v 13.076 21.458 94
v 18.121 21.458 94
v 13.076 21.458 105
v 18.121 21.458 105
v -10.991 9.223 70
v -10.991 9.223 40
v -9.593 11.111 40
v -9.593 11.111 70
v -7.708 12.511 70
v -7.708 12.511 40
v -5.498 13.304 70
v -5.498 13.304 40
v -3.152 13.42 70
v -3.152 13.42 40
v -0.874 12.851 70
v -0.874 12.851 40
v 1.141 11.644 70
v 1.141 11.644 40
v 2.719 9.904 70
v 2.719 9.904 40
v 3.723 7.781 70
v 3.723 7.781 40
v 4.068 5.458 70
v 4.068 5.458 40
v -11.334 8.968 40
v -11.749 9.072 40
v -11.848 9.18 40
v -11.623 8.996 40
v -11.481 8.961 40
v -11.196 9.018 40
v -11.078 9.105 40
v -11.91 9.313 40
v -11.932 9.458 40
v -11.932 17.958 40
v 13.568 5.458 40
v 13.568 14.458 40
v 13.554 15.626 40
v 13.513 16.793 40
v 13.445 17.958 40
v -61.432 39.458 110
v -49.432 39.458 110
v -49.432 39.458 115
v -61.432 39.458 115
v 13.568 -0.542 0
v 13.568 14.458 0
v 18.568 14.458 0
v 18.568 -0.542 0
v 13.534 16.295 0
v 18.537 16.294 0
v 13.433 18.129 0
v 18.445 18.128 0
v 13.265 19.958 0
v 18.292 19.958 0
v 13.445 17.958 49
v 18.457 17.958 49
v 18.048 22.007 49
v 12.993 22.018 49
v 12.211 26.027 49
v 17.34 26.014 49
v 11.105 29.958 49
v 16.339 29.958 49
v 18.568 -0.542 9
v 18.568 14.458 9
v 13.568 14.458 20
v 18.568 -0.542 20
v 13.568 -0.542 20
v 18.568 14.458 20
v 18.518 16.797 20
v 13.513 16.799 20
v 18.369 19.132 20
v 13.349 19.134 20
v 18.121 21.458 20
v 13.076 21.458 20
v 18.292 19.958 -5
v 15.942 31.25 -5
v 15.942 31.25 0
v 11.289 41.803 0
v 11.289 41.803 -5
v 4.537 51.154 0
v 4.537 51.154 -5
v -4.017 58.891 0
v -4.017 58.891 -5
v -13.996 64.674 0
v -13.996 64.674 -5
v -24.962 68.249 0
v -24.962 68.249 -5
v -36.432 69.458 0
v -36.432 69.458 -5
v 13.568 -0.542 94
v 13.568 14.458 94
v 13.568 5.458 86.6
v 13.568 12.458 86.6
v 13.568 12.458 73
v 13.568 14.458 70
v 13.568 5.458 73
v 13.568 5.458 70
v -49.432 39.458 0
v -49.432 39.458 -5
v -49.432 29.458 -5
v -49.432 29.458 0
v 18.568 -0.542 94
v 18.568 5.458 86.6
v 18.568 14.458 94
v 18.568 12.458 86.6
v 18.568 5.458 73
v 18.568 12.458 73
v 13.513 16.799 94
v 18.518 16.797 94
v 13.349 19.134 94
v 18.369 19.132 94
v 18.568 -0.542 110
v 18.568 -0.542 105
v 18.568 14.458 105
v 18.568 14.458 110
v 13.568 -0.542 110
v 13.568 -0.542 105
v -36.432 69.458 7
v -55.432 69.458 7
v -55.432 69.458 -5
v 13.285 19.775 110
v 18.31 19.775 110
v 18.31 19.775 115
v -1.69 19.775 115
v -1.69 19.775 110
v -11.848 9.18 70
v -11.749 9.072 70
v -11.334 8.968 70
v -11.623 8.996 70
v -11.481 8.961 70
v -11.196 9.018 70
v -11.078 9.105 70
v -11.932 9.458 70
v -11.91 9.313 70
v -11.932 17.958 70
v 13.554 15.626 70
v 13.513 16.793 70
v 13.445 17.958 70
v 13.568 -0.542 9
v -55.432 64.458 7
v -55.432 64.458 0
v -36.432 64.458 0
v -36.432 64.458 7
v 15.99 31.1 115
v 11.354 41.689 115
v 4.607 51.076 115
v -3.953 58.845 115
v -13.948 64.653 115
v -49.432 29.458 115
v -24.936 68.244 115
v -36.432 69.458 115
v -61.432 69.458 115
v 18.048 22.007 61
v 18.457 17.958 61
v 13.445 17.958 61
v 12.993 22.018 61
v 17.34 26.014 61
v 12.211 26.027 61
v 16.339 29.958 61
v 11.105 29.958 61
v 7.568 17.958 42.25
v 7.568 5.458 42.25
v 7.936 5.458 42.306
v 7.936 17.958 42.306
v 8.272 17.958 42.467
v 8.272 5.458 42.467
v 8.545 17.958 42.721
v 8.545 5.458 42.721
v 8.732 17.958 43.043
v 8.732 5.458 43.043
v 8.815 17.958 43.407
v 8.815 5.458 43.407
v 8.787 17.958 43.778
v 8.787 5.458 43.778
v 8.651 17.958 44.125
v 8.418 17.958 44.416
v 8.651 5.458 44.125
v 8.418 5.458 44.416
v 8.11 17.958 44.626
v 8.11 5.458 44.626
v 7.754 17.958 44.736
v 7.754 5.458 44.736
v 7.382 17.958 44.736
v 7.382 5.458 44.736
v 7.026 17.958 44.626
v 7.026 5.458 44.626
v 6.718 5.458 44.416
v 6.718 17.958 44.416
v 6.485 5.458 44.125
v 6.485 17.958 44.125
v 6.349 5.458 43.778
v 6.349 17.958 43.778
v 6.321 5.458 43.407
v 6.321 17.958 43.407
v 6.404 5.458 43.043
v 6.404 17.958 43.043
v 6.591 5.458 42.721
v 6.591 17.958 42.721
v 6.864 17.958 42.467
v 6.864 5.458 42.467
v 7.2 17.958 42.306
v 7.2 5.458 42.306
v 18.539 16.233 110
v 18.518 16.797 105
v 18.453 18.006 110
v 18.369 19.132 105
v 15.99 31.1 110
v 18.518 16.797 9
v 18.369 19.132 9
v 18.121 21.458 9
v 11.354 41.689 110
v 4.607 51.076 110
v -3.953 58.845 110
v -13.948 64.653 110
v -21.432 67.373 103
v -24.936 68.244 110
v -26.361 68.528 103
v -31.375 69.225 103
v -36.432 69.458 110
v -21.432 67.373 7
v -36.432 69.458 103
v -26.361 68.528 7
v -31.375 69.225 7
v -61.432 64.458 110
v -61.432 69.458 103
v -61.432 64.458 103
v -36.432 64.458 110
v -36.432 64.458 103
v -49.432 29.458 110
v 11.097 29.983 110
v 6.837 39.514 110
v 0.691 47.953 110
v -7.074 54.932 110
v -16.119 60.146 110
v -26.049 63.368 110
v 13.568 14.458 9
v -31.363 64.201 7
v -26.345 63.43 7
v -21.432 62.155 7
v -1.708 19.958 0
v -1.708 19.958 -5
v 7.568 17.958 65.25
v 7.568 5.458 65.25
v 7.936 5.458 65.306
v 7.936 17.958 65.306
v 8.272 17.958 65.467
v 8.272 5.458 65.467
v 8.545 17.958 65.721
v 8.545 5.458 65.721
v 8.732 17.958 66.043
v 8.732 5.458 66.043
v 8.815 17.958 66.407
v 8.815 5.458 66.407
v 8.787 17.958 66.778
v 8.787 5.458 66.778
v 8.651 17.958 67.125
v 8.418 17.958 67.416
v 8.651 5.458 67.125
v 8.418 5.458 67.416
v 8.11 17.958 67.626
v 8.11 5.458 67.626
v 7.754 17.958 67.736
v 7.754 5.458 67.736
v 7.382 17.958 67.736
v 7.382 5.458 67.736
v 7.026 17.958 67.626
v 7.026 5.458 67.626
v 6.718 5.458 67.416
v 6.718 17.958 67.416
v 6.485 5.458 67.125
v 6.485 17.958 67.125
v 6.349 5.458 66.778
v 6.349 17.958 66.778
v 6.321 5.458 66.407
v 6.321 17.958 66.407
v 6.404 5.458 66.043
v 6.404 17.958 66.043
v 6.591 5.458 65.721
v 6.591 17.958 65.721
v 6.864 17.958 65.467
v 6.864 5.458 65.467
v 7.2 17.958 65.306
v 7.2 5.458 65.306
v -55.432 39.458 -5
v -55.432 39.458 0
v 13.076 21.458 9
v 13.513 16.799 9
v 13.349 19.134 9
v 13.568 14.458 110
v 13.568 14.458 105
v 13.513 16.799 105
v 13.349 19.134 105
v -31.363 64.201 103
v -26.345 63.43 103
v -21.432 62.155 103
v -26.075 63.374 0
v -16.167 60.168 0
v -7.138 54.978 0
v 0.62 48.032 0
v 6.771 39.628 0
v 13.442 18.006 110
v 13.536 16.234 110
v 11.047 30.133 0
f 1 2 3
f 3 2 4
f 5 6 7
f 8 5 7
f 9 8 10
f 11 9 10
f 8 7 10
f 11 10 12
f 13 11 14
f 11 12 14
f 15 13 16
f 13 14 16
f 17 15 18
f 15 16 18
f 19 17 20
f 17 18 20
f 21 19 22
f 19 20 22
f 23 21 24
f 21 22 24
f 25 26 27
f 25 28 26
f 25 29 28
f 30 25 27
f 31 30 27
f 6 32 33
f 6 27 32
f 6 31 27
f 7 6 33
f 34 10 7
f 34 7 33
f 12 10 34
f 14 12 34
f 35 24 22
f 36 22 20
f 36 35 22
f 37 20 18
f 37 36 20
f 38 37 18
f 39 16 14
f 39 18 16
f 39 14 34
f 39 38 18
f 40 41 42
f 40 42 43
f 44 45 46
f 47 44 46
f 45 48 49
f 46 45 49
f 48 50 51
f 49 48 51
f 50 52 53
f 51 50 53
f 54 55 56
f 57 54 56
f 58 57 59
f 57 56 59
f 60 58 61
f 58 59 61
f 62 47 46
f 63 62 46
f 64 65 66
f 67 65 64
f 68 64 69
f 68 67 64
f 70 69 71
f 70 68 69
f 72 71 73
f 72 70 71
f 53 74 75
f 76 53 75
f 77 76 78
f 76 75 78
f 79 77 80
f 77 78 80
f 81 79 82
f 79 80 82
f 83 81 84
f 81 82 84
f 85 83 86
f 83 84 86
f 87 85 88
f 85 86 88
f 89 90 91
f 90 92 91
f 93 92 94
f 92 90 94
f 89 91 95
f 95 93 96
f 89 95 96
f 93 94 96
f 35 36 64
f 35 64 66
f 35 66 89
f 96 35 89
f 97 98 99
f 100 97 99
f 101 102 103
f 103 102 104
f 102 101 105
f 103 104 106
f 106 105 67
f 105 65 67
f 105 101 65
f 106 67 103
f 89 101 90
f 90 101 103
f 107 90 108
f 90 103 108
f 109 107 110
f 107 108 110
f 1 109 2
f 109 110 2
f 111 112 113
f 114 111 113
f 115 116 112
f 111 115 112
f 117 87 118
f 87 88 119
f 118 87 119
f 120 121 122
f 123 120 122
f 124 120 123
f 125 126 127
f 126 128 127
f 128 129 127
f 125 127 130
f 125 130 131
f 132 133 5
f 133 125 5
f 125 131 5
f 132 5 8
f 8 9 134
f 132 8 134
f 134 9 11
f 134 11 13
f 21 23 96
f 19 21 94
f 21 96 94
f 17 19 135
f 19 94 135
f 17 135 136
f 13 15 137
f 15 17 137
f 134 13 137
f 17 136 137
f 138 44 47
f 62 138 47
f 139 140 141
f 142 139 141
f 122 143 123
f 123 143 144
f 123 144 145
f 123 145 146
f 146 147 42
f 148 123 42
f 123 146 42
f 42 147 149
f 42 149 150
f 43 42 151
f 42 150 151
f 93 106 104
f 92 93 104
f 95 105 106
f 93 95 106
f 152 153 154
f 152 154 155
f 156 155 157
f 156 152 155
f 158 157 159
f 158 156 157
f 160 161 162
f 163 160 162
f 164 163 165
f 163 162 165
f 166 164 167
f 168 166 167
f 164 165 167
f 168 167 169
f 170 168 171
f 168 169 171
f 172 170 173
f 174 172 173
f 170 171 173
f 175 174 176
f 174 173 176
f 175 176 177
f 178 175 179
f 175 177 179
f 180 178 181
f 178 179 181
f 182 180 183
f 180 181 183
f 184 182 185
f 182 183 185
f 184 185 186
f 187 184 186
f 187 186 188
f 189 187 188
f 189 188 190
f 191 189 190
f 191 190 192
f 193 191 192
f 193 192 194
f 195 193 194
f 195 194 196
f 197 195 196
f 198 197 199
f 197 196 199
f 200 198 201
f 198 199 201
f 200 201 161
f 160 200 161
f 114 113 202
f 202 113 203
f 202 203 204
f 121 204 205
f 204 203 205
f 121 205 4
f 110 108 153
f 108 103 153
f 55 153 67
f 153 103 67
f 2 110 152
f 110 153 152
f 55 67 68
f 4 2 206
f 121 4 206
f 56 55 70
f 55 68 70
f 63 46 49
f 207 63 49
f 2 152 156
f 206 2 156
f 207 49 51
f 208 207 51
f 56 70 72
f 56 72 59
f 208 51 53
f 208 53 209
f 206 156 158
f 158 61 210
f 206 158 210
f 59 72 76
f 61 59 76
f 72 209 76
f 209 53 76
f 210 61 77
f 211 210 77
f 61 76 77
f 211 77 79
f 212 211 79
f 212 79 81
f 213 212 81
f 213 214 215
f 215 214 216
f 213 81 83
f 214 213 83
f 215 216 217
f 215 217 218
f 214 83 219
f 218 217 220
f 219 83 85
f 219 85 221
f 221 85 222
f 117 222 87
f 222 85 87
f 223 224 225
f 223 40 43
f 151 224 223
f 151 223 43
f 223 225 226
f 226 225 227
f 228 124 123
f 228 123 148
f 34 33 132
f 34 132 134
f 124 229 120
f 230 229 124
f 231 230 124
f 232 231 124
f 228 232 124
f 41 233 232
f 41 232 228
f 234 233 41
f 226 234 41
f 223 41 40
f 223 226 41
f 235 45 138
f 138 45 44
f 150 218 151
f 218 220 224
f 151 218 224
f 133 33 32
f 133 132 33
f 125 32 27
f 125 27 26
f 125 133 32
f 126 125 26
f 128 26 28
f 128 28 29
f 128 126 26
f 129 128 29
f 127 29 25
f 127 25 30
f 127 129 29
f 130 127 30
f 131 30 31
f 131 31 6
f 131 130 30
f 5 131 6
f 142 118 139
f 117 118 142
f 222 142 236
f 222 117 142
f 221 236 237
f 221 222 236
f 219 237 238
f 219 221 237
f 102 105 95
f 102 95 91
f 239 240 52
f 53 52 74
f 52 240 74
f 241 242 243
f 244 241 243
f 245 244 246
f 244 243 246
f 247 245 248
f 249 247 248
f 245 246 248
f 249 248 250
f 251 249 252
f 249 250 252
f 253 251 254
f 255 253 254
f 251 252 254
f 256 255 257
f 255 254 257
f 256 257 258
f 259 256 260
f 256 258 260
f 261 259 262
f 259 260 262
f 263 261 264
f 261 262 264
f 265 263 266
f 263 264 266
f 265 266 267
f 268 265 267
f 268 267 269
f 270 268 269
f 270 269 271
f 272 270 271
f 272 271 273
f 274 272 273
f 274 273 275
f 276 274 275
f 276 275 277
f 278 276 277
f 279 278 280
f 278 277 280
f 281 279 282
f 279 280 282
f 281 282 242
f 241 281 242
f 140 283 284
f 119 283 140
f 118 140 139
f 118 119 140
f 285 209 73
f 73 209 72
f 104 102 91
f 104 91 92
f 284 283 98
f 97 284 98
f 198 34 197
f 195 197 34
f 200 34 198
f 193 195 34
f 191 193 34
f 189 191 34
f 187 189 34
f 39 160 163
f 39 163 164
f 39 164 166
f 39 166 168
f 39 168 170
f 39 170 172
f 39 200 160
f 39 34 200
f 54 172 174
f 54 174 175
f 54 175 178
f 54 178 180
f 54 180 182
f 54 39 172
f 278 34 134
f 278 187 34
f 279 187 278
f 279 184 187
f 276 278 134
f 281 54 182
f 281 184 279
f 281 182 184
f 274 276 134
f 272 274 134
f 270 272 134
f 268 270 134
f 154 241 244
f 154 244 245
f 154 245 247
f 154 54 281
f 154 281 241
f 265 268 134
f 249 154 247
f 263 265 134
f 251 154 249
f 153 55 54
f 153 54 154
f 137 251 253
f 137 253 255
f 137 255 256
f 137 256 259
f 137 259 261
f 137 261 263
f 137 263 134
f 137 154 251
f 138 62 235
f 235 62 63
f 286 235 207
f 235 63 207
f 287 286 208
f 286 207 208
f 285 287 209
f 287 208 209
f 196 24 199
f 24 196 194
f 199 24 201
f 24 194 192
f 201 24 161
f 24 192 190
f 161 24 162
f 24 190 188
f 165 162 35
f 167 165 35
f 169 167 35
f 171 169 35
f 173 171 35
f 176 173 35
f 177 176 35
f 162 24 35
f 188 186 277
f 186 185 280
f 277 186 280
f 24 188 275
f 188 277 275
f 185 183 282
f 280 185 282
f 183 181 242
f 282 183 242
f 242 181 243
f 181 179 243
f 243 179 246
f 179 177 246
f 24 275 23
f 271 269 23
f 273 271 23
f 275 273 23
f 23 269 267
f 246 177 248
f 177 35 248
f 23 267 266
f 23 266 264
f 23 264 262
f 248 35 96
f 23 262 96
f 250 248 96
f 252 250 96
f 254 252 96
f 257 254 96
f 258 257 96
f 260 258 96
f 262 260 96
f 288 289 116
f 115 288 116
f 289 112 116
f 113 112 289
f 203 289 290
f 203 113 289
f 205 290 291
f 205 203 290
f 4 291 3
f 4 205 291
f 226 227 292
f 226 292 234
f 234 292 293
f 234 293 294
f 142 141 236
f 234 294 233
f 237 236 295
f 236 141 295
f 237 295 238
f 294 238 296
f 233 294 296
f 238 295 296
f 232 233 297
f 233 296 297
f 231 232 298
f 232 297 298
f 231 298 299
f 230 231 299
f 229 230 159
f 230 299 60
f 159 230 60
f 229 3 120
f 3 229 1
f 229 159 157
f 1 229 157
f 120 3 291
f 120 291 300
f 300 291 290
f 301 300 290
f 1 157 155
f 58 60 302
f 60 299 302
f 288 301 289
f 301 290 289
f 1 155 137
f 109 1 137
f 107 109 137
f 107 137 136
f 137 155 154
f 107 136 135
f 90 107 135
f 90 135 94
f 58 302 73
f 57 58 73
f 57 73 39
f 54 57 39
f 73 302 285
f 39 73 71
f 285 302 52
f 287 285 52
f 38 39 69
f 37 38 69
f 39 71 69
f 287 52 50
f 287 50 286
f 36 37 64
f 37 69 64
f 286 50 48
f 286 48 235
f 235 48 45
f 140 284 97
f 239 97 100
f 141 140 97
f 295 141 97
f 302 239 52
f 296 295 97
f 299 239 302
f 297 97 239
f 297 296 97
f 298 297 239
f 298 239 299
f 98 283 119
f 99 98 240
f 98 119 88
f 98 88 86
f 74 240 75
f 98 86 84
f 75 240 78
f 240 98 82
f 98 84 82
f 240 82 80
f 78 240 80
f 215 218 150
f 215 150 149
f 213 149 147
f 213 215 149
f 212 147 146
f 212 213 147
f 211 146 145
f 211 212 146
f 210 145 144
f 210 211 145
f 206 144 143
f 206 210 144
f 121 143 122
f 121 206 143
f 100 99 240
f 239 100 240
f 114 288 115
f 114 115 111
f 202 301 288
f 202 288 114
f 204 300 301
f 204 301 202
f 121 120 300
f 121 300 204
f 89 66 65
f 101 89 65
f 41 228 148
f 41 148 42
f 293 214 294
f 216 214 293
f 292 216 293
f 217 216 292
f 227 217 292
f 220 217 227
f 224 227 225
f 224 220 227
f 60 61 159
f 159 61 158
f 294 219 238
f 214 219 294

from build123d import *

# Parameters (mm, degrees)
BOSS_EXTRUDE1_DEPTH     = 110
SKETCH2_W               = 30
SKETCH2_H               = 12.5
BOSS_EXTRUDE2_DEPTH     = 35
SKETCH3_R               = 8
CUT_EXTRUDE1_DEPTH      = 121.603742452
SKETCH4_R               = 1.5
SKETCH4_R_2             = 1.25
CUT_EXTRUDE2_DEPTH      = 12.5
SKETCH5_W               = 9.5
SKETCH5_H               = 12.5
CUT_EXTRUDE3_DEPTH      = 121.603742452
FILLET4_R               = 0.5
BOSS_EXTRUDE3_DEPTH     = 5
CUT_EXTRUDE4_DEPTH      = 158.919156753
CUT_EXTRUDE4_DEPTH_BACK = 158.919156753
SKETCH7_W               = 12
SKETCH7_H               = 12
SKETCH7_W_2             = 11
SKETCH7_H_2             = 22
SKETCH7_W_3             = 13.6
SKETCH7_H_3             = 7
BOSS_EXTRUDE4_START     = 5
BOSS_EXTRUDE4_DEPTH     = 5
CUT_EXTRUDE5_DEPTH      = 152.478720037


with BuildPart() as part:
    # Sketch1 → Boss-Extrude1 (new body)
    with BuildSketch(Plane.XY):
        with BuildLine():
            Line((13.568, -0.541666667), (18.568, -0.541666667))
            Line((18.568, -0.541666667), (18.568, 14.458333333))
            ThreePointArc((18.568, 14.458333333), (2.458872965, 53.349206299), (-36.432, 69.458333333))
            Line((-36.432, 69.458333333), (-69.432, 69.458333333))
            Line((-69.432, 69.458333333), (-69.432, 64.458333333))
            Line((-69.432, 64.458333333), (-36.432, 64.458333333))
            ThreePointArc((-36.432, 64.458333333), (-1.076660941, 49.813672393), (13.568, 14.458333333))
            Line((13.568, 14.458333333), (13.568, -0.541666667))
        make_face()
    extrude(amount=BOSS_EXTRUDE1_DEPTH)

    # Sketch2 → Boss-Extrude2 (add)
    with BuildSketch(Plane.ZY.offset(-13.568)):
        with Locations((55, 11.708333333)):
            Rectangle(SKETCH2_W, SKETCH2_H)
    extrude(amount=BOSS_EXTRUDE2_DEPTH)

    # Sketch3 → Cut-Extrude1 (cut, through all)
    with BuildSketch(Plane(origin=(0, 0, 40), x_dir=(-1, 0, 0), z_dir=(0, 0, -1))):
        with Locations((3.932, 5.458333333)):
            Circle(SKETCH3_R)
    extrude(amount=-CUT_EXTRUDE1_DEPTH, mode=Mode.SUBTRACT)

    # Sketch4 → Cut-Extrude2 (cut)
    with BuildSketch(Plane.XZ.offset(-5.458333333)):
        with Locations(Location((-17.932, 43.5, 0), (0, 0, 270))):
            Circle(SKETCH4_R)
        with Locations(Location((-17.932, 66.5, 0), (0, 0, 270))):
            Circle(SKETCH4_R)
        with Locations(Location((7.568, 43.5, 0), (0, 0, 270))):
            Circle(SKETCH4_R_2)
        with Locations(Location((7.568, 66.5, 0), (0, 0, 270))):
            Circle(SKETCH4_R_2)
    extrude(amount=-CUT_EXTRUDE2_DEPTH, mode=Mode.SUBTRACT)

    # Sketch5 → Cut-Extrude3 (cut, through all)
    with BuildSketch(Plane(origin=(0, 0, 40), x_dir=(-1, 0, 0), z_dir=(0, 0, -1))):
        with Locations((16.682, 11.708333333)):
            Rectangle(SKETCH5_W, SKETCH5_H)
    extrude(amount=-CUT_EXTRUDE3_DEPTH, mode=Mode.SUBTRACT)

    # Fillet4
    fillet4_edges = [part.edges().sort_by_distance(p)[0] for p in [
        (-11.932, 5.458333333, 55),
    ]]
    fillet(fillet4_edges, radius=FILLET4_R)

    # Sketch6 → Boss-Extrude3 (add)
    with BuildSketch(Plane.XY.offset(110)):
        with BuildLine():
            Line((18.310426703, 19.774978769), (-1.689573297, 19.774978769))
            Line((-1.689573297, 19.774978769), (-49.432, 29.458333333))
            Line((-49.432, 29.458333333), (-49.432, 39.458333333))
            Line((-49.432, 39.458333333), (-69.432, 39.458333333))
            Line((-69.432, 39.458333333), (-69.432, 69.458333333))
            Line((-69.432, 69.458333333), (-36.432, 69.458333333))
            ThreePointArc((-36.432, 69.458333333), (0.531390679, 55.1855693), (18.310426703, 19.774978769))
        make_face()
    extrude(amount=BOSS_EXTRUDE3_DEPTH)

    # Sketch7 → Cut-Extrude4 (cut, two sides: drawn at the far end of the back side and taken through both)
    with BuildSketch(Plane.ZY.offset(-13.568).offset(-CUT_EXTRUDE4_DEPTH_BACK)):
        with Locations((55, 23.958333333)):
            Rectangle(SKETCH7_W, SKETCH7_H)
        with Locations((99.5, 10.458333333)):
            Rectangle(SKETCH7_W_2, SKETCH7_H_2)
        with Locations((14.5, 10.458333333)):
            Rectangle(SKETCH7_W_2, SKETCH7_H_2)
        with Locations((79.8, 8.958333333)):
            Rectangle(SKETCH7_W_3, SKETCH7_H_3)
    extrude(amount=CUT_EXTRUDE4_DEPTH + CUT_EXTRUDE4_DEPTH_BACK, mode=Mode.SUBTRACT)

    # Sketch8 → Boss-Extrude4 (add)
    with BuildSketch(Plane(origin=(0, 0, 0), x_dir=(-1, 0, 0), z_dir=(0, 0, -1)).offset(BOSS_EXTRUDE4_START)):
        with BuildLine():
            Line((36.432, 69.458333333), (69.432, 69.458333333))
            Line((69.432, 69.458333333), (69.432, 64.458333333))
            Line((69.432, 64.458333333), (69.432, 39.458333333))
            Line((69.432, 39.458333333), (49.432, 39.458333333))
            Line((49.432, 39.458333333), (49.432, 29.458333333))
            Line((49.432, 29.458333333), (1.707690959, 19.958333333))
            Line((1.707690959, 19.958333333), (-18.292309041, 19.958333333))
            ThreePointArc((-18.292309041, 19.958333333), (-0.463121629, 55.247425012), (36.432, 69.458333333))
        make_face()
    extrude(amount=-BOSS_EXTRUDE4_DEPTH)

    # Sketch9 → Cut-Extrude5 (cut, through all)
    with BuildSketch(Plane(origin=(0, 69.458333333, 0), x_dir=(1, 0, 0), z_dir=(0, 1, 0))):
        Polygon((-55.432, -7), (-21.432, -7), (-21.432, -103), (-61.432, -103), (-61.432, -133.715891386), (-92.425116466, -133.715891386), (-92.425116466, -103), (-92.425116466, -7), (-92.425116466, 8.214128056), (-55.432, 8.214128056), align=None)
    extrude(amount=-CUT_EXTRUDE5_DEPTH, mode=Mode.SUBTRACT)


solid = part.part
